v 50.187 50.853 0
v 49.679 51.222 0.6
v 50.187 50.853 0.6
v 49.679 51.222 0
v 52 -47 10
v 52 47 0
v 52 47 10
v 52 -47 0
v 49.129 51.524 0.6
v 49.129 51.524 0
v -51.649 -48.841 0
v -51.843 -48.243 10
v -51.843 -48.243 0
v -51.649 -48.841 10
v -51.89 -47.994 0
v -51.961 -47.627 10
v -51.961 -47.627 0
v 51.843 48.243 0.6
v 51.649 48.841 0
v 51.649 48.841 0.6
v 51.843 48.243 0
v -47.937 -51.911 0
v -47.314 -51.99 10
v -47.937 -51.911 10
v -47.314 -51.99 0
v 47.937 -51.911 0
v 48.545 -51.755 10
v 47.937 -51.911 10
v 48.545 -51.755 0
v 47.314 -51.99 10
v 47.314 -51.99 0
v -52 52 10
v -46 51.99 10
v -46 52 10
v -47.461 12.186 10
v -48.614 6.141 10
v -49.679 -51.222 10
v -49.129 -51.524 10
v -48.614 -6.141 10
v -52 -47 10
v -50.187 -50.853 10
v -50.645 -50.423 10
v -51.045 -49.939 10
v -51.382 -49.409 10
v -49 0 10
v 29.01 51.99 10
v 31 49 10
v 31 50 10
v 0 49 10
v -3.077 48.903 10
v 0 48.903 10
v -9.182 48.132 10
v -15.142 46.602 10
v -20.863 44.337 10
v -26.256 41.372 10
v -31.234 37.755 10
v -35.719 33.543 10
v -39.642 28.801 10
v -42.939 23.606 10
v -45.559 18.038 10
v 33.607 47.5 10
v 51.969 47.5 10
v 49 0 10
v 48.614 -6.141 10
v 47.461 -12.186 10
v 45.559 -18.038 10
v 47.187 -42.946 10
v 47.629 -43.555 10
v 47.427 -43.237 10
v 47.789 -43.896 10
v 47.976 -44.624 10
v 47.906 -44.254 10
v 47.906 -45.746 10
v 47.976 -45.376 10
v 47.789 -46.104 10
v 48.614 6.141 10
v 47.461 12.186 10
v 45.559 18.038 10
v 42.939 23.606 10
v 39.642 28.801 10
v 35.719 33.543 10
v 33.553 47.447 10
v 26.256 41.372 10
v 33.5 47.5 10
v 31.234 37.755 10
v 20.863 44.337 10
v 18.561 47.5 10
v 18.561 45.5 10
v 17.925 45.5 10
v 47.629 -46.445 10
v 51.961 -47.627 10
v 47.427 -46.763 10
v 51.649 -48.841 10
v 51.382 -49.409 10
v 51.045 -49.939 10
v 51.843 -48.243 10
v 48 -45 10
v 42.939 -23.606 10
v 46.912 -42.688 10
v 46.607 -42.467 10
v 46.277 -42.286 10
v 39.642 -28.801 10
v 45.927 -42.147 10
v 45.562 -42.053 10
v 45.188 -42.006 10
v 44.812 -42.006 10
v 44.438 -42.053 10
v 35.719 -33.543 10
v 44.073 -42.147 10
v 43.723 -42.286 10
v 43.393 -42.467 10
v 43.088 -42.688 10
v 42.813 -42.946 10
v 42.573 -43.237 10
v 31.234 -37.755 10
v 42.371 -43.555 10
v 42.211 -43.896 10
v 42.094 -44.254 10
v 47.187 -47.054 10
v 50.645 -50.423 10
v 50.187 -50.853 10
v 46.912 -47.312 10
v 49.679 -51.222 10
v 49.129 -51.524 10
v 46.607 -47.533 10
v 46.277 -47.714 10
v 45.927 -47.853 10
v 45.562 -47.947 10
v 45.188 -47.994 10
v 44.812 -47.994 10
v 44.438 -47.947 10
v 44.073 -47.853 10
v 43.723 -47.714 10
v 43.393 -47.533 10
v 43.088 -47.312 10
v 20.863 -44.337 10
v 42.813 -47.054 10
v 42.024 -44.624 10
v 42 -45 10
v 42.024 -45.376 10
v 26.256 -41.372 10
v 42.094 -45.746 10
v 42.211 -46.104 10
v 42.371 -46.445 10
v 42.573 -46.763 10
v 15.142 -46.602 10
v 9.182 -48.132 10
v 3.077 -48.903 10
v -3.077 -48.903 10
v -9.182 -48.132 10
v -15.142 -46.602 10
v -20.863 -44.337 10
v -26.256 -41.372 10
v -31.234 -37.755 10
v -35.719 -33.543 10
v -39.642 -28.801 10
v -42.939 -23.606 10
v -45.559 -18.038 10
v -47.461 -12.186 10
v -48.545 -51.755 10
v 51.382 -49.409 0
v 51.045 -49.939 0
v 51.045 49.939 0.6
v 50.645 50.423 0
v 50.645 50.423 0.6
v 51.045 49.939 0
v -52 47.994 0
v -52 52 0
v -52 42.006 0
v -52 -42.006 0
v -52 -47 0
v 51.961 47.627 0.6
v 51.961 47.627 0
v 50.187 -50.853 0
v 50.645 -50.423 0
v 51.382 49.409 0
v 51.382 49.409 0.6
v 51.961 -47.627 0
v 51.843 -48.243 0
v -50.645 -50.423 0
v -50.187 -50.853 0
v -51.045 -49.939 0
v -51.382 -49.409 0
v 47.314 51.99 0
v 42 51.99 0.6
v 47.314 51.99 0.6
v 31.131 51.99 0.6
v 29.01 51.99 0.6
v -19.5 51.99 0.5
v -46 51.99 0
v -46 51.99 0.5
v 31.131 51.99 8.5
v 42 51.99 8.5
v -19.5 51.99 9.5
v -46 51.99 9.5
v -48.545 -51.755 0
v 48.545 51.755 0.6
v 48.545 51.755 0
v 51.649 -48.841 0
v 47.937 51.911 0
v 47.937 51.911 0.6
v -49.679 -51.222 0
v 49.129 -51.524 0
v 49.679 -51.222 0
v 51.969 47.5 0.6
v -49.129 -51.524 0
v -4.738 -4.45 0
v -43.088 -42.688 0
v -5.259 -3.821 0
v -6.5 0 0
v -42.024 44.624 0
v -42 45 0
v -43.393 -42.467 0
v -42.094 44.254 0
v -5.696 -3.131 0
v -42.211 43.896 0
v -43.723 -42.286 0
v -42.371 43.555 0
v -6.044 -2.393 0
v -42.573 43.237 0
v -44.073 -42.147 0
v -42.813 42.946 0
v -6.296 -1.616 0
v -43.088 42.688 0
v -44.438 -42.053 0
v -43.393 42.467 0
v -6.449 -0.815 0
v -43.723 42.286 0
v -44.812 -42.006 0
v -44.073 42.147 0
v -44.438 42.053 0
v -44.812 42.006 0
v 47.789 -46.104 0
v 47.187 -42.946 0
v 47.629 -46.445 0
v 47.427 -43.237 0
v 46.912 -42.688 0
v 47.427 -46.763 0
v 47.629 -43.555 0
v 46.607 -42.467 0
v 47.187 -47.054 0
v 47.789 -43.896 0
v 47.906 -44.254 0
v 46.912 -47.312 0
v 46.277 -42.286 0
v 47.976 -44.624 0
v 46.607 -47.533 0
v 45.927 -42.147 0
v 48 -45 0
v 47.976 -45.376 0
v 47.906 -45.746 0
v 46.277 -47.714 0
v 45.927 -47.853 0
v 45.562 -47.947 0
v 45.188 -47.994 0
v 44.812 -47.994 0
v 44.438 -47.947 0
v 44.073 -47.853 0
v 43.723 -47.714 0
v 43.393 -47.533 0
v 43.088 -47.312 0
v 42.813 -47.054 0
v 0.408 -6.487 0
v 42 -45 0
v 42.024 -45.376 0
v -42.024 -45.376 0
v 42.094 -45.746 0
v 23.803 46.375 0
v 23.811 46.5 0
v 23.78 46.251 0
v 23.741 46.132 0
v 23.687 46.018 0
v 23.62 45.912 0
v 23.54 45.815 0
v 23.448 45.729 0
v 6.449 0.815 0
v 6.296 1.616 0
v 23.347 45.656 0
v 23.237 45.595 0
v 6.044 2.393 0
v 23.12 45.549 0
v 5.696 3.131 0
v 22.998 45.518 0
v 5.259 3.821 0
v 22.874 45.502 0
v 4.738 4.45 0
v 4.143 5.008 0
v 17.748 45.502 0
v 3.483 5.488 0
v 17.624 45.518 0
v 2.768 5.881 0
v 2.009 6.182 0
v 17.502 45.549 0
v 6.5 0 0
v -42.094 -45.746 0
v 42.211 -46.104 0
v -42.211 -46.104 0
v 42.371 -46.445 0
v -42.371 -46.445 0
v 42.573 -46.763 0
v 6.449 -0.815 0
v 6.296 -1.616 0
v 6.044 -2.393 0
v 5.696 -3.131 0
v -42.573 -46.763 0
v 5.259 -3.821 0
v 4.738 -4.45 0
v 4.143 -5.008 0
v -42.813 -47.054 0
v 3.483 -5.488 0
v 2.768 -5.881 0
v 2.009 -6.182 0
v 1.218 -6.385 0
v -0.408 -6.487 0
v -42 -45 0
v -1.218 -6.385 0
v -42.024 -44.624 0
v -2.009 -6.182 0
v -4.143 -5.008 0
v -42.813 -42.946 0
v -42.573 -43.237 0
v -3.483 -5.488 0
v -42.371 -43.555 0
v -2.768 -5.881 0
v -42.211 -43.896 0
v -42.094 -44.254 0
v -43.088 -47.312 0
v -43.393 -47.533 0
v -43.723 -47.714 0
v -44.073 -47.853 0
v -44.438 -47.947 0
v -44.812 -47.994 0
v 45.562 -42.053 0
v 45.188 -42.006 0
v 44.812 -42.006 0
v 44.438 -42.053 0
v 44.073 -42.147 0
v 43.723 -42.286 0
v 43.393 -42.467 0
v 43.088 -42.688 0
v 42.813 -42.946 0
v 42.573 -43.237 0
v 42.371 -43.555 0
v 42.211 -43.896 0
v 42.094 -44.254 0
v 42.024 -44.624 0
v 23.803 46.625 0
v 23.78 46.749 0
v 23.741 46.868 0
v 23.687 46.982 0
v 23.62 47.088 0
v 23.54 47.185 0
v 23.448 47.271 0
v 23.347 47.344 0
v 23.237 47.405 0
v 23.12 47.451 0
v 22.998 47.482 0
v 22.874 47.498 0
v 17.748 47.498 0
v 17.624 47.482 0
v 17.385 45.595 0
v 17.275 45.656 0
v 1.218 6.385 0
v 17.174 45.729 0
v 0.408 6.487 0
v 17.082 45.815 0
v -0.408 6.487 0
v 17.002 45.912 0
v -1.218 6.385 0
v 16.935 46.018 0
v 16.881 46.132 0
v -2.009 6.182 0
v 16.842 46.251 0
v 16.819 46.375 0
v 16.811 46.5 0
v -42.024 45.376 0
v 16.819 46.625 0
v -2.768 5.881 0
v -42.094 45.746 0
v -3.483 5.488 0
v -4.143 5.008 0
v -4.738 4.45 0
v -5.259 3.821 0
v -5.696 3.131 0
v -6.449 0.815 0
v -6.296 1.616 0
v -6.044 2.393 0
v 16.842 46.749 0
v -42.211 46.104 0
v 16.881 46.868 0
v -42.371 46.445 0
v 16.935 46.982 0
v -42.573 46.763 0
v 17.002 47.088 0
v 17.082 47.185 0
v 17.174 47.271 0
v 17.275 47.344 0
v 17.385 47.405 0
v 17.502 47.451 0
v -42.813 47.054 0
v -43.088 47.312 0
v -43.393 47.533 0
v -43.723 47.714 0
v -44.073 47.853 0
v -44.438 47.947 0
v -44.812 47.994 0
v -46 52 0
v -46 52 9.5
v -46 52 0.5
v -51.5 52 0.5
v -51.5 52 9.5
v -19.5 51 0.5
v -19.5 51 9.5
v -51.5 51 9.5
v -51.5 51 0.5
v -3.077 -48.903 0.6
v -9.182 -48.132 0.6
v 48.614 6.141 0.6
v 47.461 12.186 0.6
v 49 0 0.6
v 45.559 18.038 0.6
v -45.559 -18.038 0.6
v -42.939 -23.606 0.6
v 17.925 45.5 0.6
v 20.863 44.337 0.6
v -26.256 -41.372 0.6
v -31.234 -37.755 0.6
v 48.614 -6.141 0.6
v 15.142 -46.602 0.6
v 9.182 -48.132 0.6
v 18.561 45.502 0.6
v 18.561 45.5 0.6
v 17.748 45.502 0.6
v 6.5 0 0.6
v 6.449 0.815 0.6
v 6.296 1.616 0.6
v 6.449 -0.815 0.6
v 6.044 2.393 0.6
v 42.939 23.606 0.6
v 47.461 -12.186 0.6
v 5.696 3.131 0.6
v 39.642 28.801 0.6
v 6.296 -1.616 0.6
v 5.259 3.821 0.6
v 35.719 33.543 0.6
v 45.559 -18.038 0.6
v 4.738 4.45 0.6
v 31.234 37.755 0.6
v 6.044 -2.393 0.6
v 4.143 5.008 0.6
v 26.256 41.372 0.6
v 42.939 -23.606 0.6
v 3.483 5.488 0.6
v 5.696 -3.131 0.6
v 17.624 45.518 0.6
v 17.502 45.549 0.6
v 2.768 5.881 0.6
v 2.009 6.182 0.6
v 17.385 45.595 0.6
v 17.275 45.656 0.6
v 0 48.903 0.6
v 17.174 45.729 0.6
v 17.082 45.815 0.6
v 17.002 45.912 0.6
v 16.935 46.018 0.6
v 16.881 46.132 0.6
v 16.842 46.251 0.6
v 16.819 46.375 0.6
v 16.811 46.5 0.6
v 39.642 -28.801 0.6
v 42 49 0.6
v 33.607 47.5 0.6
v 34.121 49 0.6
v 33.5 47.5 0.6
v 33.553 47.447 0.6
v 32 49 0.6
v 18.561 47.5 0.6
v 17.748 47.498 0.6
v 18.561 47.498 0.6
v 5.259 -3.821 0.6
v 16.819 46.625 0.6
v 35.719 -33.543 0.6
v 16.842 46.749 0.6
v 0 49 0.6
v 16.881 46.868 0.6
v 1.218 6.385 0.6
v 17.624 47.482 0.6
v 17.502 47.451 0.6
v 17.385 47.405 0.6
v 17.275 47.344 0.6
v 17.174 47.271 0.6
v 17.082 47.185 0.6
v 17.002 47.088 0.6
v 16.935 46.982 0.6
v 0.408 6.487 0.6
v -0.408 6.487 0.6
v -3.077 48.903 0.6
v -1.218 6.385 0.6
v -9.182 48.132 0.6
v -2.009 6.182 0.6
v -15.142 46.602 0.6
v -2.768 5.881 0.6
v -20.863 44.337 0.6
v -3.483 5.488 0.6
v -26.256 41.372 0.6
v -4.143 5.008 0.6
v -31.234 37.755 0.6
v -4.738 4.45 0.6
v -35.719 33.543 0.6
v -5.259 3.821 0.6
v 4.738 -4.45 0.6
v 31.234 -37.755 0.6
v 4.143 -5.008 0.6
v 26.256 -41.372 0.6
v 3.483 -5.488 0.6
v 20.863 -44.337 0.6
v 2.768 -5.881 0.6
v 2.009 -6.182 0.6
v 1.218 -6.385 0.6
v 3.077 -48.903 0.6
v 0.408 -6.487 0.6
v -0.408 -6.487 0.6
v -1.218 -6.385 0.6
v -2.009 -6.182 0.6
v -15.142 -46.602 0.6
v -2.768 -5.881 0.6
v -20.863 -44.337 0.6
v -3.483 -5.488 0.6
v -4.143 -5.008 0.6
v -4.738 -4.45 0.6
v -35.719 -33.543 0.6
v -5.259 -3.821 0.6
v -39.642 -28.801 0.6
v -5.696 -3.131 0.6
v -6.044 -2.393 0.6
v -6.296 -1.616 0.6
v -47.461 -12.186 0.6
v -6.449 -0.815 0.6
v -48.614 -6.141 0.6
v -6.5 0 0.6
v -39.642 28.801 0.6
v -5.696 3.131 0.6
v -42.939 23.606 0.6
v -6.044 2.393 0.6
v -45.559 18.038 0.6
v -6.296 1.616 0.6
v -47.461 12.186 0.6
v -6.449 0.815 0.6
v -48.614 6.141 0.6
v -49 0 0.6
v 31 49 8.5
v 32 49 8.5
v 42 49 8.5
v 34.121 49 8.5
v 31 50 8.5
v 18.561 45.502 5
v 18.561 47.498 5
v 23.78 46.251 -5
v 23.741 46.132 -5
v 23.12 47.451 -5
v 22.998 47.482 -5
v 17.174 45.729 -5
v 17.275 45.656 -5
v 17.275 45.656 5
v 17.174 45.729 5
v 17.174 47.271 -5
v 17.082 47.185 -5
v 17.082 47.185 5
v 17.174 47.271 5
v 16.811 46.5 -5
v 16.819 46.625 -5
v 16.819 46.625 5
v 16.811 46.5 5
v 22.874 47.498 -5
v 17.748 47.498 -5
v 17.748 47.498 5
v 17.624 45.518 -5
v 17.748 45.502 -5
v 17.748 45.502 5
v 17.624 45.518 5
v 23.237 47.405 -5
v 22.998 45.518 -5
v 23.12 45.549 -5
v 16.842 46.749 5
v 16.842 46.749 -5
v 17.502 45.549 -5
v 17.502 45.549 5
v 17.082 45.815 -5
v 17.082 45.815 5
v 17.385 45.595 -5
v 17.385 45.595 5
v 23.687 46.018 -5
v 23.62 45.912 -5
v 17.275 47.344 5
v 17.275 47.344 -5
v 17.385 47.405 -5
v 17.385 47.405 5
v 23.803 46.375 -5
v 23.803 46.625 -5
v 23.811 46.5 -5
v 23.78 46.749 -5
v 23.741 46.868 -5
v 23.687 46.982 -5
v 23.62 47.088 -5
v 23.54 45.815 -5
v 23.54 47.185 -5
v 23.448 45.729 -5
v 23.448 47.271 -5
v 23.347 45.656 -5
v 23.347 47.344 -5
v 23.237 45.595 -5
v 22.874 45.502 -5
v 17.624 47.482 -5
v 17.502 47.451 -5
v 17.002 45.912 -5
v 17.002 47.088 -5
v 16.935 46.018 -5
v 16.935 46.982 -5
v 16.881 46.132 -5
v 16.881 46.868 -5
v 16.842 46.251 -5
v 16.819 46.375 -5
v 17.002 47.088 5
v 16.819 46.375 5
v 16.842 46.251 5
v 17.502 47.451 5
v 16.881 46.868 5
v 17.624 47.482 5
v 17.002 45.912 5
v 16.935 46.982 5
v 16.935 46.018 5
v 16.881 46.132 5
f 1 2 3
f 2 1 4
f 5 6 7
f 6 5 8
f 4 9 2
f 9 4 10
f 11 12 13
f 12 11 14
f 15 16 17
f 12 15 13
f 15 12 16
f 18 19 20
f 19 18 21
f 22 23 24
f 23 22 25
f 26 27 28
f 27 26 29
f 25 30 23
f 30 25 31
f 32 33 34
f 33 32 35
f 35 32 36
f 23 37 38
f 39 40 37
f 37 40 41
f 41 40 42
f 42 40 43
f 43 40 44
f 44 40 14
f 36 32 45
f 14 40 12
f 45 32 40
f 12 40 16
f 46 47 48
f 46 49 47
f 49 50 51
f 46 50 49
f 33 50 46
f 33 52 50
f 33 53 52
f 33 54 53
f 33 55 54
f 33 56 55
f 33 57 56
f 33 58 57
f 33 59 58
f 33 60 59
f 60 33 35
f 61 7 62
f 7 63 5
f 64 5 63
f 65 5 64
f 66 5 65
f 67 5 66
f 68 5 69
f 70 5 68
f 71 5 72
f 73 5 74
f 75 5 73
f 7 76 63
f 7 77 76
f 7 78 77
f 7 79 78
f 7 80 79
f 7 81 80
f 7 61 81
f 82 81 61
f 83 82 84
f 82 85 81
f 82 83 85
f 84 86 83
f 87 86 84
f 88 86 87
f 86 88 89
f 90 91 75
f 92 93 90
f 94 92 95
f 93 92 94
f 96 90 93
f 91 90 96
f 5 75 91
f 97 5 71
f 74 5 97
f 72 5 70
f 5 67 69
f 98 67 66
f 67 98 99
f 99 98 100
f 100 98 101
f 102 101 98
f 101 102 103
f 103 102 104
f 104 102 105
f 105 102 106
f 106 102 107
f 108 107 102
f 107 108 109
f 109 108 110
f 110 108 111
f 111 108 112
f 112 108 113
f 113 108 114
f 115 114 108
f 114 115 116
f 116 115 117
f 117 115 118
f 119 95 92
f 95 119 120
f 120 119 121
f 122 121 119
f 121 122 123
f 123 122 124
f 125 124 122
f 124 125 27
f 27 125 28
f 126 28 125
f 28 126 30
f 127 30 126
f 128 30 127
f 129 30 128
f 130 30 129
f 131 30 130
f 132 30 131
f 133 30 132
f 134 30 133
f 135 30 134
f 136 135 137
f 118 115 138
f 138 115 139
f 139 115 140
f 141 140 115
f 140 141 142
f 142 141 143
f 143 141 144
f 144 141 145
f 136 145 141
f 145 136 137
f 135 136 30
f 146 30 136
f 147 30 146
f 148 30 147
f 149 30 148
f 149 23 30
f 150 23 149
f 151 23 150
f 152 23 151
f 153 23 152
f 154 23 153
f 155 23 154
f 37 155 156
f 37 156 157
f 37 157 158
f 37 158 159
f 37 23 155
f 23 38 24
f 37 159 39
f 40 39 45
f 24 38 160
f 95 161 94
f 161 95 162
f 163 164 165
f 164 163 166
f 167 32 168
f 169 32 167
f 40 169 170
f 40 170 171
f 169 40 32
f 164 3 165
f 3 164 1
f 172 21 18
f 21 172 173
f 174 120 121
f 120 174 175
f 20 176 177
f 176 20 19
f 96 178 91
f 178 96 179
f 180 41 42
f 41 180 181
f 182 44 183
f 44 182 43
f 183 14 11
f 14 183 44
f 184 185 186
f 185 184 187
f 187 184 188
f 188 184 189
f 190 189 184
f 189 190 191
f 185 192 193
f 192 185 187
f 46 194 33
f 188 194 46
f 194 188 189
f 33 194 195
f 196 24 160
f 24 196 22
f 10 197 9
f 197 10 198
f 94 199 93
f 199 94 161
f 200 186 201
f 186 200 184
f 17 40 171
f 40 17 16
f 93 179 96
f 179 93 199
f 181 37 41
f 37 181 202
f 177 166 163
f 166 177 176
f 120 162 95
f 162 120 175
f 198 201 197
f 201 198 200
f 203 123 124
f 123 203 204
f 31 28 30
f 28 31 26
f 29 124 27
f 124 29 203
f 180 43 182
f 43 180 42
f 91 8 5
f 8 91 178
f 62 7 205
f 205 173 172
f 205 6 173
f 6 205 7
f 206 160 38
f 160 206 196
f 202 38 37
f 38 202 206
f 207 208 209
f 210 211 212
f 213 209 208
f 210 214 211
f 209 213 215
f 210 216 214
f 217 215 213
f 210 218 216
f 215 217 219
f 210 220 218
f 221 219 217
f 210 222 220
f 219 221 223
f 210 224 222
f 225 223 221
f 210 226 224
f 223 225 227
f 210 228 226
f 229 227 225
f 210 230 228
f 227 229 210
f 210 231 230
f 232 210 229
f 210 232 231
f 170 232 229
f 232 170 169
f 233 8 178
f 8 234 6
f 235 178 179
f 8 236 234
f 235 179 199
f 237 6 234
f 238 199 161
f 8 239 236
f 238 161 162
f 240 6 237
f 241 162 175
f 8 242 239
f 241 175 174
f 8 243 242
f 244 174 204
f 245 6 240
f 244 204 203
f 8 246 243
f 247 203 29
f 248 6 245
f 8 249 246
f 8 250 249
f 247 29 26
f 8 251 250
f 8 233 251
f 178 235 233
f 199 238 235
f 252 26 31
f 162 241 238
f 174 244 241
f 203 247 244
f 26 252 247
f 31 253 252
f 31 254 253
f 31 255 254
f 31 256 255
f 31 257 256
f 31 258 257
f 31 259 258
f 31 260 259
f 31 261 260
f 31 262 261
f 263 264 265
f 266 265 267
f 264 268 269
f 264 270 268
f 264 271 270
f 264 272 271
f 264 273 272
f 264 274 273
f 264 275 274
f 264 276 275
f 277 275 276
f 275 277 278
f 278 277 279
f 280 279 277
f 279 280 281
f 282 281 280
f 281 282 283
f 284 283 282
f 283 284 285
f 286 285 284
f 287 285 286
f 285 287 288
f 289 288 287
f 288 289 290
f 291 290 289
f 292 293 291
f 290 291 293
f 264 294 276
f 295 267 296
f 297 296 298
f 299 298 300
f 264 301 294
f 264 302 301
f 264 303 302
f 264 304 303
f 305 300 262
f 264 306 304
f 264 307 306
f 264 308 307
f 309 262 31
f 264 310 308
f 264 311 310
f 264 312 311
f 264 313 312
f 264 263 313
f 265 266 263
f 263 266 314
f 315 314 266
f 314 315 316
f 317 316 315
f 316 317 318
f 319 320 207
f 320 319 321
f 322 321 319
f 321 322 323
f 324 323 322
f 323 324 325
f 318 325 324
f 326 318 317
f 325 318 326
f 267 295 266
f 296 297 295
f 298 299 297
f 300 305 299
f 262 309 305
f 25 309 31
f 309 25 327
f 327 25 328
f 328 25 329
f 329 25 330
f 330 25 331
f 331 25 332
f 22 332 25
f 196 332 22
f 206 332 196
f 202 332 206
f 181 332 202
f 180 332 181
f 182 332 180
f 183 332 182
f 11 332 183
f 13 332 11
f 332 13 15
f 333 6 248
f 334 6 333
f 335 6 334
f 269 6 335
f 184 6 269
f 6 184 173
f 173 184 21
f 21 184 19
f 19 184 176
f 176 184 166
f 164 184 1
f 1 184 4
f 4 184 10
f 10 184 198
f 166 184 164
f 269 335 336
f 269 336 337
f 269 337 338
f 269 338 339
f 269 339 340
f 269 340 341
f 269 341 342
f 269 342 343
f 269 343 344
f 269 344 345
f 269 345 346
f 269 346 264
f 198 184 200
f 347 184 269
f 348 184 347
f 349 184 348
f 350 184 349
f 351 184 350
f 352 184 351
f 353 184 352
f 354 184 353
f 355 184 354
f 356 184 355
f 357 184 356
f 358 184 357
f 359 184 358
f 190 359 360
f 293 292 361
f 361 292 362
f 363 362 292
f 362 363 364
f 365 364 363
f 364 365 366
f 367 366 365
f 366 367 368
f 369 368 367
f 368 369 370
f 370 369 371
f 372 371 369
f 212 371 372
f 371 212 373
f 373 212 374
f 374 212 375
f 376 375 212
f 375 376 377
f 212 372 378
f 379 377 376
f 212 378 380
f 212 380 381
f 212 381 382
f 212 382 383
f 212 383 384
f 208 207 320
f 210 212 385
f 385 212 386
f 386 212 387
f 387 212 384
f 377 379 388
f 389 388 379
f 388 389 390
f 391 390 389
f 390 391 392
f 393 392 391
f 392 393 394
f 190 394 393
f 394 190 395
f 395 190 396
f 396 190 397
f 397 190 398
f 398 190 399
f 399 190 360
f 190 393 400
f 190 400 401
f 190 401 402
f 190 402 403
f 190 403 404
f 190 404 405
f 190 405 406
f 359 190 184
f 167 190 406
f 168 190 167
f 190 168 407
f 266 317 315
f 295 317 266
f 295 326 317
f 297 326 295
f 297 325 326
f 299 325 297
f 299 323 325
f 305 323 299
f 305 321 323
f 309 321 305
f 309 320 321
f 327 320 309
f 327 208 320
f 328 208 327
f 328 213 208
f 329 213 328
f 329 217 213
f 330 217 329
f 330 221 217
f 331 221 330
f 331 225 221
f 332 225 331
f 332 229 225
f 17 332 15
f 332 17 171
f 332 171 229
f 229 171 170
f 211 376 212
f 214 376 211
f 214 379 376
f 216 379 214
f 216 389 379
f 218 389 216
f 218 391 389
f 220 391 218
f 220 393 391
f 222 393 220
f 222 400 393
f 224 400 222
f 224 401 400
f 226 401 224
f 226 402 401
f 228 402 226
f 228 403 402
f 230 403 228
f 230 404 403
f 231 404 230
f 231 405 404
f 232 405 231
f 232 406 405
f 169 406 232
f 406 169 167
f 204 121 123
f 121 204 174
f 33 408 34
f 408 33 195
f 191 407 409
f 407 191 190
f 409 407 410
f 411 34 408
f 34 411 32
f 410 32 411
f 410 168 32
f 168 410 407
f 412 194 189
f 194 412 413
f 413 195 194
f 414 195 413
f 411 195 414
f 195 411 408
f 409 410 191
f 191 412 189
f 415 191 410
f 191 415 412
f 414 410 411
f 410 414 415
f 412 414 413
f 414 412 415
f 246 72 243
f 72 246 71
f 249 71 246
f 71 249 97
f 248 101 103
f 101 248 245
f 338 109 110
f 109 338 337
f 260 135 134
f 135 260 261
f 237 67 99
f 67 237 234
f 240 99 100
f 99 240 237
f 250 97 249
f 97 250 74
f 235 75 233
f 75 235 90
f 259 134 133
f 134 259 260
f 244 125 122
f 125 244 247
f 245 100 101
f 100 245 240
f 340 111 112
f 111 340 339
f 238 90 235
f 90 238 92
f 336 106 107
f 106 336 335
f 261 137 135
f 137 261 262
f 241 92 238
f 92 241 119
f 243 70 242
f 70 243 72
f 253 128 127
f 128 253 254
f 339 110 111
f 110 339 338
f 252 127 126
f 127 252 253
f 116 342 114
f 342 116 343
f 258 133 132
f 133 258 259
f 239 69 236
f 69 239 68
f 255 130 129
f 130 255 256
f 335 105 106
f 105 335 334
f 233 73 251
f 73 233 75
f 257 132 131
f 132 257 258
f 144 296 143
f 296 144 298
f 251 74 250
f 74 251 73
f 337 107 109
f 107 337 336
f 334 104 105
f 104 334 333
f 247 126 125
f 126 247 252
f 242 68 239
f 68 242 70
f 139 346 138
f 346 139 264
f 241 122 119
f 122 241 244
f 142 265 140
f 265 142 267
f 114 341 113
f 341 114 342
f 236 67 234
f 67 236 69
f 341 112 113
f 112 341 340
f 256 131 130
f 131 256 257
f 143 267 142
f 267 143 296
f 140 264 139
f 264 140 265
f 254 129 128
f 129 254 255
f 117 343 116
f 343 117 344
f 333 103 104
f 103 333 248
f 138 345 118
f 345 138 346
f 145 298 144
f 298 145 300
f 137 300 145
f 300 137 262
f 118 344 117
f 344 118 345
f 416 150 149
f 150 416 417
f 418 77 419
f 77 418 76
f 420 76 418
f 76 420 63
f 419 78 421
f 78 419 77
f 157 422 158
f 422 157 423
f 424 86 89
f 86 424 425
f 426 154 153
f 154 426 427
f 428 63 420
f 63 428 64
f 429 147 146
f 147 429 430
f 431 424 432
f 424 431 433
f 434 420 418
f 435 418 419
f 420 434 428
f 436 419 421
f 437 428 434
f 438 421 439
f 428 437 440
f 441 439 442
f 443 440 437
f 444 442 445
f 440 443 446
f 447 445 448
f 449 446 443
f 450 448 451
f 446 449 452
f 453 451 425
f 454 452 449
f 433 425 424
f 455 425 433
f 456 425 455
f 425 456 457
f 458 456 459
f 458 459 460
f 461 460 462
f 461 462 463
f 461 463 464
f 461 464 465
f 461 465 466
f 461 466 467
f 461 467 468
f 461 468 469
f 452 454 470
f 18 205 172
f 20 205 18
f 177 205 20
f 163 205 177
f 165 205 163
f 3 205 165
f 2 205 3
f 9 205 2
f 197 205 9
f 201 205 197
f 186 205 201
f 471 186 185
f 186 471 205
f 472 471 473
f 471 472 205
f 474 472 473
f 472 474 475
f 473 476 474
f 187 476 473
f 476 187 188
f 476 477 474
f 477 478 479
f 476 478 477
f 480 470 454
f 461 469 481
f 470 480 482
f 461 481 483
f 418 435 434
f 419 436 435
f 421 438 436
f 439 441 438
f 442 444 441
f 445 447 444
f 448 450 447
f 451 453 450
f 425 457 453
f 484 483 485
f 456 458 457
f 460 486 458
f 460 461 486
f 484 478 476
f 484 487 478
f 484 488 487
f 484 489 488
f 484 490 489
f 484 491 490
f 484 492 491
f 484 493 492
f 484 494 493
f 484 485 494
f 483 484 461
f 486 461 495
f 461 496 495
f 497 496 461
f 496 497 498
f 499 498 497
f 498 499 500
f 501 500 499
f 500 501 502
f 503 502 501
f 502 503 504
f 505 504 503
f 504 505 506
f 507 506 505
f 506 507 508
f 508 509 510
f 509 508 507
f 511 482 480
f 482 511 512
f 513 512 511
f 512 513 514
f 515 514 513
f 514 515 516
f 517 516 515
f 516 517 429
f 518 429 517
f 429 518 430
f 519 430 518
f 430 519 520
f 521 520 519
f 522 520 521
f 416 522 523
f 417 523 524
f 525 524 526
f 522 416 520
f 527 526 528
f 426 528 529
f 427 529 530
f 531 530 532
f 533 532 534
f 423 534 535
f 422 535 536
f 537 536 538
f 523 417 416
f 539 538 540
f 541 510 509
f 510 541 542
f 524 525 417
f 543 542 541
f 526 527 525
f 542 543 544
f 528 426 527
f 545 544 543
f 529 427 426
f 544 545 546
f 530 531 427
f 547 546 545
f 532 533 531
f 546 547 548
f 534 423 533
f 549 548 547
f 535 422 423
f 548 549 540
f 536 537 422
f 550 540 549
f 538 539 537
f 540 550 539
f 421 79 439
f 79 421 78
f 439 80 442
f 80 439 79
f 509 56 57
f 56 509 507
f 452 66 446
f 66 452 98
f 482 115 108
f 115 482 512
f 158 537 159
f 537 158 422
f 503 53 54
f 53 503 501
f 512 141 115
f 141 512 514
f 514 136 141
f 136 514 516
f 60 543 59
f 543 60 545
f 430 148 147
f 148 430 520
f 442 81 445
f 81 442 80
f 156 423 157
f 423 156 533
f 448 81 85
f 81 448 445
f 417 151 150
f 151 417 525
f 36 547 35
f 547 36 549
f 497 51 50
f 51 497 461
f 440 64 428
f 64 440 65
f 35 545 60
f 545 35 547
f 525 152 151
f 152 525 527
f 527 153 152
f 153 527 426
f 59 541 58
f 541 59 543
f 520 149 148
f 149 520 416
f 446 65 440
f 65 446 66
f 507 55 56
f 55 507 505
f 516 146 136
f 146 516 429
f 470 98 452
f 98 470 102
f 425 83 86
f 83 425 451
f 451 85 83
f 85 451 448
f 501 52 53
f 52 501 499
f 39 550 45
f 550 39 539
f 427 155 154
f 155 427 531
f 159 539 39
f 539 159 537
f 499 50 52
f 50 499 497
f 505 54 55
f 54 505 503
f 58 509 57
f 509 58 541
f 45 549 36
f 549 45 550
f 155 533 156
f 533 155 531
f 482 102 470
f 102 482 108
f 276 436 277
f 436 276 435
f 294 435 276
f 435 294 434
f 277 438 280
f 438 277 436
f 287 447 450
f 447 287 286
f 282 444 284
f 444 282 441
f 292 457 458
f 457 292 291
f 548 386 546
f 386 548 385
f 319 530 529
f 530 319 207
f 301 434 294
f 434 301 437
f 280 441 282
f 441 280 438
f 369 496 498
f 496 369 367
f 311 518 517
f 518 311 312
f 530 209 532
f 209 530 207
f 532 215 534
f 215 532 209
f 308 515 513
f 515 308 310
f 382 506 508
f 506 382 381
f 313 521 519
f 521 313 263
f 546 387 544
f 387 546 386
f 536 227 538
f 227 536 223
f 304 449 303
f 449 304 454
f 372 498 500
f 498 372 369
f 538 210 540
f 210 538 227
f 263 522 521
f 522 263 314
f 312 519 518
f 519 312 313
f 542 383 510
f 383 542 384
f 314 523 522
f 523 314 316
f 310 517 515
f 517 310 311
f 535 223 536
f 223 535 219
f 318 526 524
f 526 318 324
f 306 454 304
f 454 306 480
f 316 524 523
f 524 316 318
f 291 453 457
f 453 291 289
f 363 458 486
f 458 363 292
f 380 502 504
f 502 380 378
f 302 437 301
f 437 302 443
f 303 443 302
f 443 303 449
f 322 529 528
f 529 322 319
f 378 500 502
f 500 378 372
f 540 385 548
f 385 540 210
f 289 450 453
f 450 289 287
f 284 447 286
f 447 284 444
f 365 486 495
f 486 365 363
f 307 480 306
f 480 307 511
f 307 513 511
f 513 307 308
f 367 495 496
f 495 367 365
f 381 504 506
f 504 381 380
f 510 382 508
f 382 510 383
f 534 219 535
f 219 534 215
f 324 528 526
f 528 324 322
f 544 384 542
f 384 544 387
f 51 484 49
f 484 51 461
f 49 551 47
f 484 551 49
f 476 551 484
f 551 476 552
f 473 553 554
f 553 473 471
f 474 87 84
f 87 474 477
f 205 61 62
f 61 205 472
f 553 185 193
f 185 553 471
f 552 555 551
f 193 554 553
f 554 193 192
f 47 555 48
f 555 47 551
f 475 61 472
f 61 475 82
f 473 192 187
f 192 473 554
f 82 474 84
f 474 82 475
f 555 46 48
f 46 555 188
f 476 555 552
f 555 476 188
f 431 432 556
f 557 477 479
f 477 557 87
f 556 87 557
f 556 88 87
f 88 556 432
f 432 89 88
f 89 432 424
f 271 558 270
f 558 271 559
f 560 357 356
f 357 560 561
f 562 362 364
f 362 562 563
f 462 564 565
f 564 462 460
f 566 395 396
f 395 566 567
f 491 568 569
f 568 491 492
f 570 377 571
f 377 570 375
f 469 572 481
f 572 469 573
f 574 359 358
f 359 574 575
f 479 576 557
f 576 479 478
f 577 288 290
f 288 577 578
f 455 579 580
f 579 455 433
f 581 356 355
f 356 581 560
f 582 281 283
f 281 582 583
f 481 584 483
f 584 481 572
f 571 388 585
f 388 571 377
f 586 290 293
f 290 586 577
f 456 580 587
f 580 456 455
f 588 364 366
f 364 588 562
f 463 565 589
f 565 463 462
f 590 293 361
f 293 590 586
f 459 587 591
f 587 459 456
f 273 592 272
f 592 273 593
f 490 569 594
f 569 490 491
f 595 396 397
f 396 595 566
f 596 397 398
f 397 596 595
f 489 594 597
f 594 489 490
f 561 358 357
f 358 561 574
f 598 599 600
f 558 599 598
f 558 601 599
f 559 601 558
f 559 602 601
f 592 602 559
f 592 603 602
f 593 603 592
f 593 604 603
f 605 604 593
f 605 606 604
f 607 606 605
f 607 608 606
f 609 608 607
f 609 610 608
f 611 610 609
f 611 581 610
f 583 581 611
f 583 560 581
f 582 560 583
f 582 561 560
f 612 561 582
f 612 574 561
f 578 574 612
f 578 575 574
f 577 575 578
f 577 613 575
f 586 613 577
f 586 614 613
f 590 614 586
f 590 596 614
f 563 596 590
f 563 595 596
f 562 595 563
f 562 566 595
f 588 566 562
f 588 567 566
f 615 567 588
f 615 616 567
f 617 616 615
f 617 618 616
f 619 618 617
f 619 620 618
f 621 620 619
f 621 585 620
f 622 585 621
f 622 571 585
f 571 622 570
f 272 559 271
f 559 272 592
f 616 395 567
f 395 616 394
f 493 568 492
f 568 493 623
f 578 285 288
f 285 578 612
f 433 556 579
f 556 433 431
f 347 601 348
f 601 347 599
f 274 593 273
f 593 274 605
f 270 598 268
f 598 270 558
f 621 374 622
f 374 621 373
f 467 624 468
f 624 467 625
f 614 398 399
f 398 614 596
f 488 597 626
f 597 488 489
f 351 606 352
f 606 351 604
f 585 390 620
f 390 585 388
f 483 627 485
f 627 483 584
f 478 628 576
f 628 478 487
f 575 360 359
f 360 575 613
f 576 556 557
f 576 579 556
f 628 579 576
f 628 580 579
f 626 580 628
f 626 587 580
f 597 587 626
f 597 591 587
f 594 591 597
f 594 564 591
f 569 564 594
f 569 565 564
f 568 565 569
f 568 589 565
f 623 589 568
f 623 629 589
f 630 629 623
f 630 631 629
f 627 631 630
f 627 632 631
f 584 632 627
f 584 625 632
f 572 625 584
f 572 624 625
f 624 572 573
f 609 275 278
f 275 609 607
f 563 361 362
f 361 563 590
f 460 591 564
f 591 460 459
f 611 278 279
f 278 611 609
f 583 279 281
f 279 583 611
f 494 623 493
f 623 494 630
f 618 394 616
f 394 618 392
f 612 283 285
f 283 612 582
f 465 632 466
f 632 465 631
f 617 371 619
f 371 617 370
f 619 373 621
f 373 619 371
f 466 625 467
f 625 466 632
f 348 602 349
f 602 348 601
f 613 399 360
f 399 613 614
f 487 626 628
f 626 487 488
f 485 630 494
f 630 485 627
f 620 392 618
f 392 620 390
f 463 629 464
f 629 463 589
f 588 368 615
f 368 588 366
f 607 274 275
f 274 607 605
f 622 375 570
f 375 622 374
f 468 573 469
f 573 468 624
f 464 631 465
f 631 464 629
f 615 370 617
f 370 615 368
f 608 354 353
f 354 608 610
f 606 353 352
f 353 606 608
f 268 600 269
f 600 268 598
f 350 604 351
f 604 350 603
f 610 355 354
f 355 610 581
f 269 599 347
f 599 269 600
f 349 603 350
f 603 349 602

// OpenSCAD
$fn = 50;


union() {
	difference() {
		union() {
			hull() {
				translate(v = [-47.0000000000, 47.0000000000, 0]) {
					cylinder(h = 10, r = 5);
				}
				translate(v = [47.0000000000, 47.0000000000, 0]) {
					cylinder(h = 10, r = 5);
				}
				translate(v = [-47.0000000000, -47.0000000000, 0]) {
					cylinder(h = 10, r = 5);
				}
				translate(v = [47.0000000000, -47.0000000000, 0]) {
					cylinder(h = 10, r = 5);
				}
			}
			translate(v = [-52.0000000000, 46.0000000000, 0]) {
				cube(size = [6, 6, 10]);
			}
		}
		union() {
			translate(v = [-52.5000000000, -45.0000000000, -250.0000000000]) {
				rotate(a = [0, 0, 0]) {
					difference() {
						union() {
							hull() {
								translate(v = [7.5000000000, 0, 0]) {
									cylinder(h = 250, r = 3.0000000000, r1 = 3.0000000000, r2 = 3.0000000000);
								}
								translate(v = [-7.5000000000, 0, 0]) {
									cylinder(h = 250, r = 3.0000000000, r1 = 3.0000000000, r2 = 3.0000000000);
								}
							}
						}
						union();
					}
				}
			}
			translate(v = [-52.5000000000, 45.0000000000, -250.0000000000]) {
				rotate(a = [0, 0, 0]) {
					difference() {
						union() {
							hull() {
								translate(v = [7.5000000000, 0, 0]) {
									cylinder(h = 250, r = 3.0000000000, r1 = 3.0000000000, r2 = 3.0000000000);
								}
								translate(v = [-7.5000000000, 0, 0]) {
									cylinder(h = 250, r = 3.0000000000, r1 = 3.0000000000, r2 = 3.0000000000);
								}
							}
						}
						union();
					}
				}
			}
			translate(v = [-51.5000000000, 51.0000000000, 0.5000000000]) {
				cube(size = [32, 1, 9.0000000000]);
			}
			translate(v = [45.0000000000, -45.0000000000, 0]) {
				cylinder(h = 100, r = 3.0000000000);
			}
			translate(v = [0, 0, 0.6000000000]) {
				cylinder(h = 12.4000000000, r = 49.0000000000);
			}
			translate(v = [0, 0, -5.0000000000]) {
				cylinder(h = 10, r = 6.5000000000);
			}
			translate(v = [0.0000000000, 47.5000000000, 0.6000000000]) {
				cube(size = [52.0000000000, 1.5000000000, 12.4000000000]);
			}
			translate(v = [42.0000000000, 47.5000000000, 0.6000000000]) {
				cube(size = [10, 4.5000000000, 12.4000000000]);
			}
			translate(v = [31.0000000000, 47.5000000000, 8.5000000000]) {
				cube(size = [21, 4.5000000000, 1.5000000000]);
			}
			translate(v = [28.2500000000, 52.7500000000, 0.6000000000]) {
				rotate(a = [0, 0, -45]) {
					cube(size = [7.5000000000, 1.5000000000, 12.4000000000]);
				}
			}
			translate(v = [11.0610000000, 45.5000000000, 0.6000000000]) {
				cube(size = [7.5000000000, 2, 9.4000000000]);
			}
		}
	}
	union() {
		translate(v = [20.3110000000, 46.5000000000, -5.0000000000]) {
			rotate(a = [0, 0, 0]) {
				difference() {
					union() {
						#hull() {
							#translate(v = [2.5000000000, 0, 0]) {
								cylinder(h = 10, r = 1.0000000000, r1 = 1.0000000000, r2 = 1.0000000000);
							}
							#translate(v = [-2.5000000000, 0, 0]) {
								cylinder(h = 10, r = 1.0000000000, r1 = 1.0000000000, r2 = 1.0000000000);
							}
						}
					}
					union();
				}
			}
		}
	}
}
